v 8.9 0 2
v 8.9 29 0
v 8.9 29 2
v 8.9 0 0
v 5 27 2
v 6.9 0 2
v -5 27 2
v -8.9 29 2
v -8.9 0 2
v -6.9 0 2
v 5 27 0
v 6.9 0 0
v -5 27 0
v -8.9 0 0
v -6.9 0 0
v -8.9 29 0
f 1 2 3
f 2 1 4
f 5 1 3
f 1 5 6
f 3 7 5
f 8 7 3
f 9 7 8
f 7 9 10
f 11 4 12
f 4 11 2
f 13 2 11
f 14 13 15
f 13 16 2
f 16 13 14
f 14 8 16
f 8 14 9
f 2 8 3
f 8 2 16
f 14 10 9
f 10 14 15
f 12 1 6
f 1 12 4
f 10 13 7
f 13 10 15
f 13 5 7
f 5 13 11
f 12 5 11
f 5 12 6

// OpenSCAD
height=27;
top=13.8 / 2;
bottom=10 / 2;
width=2;

margin = 2;
cube_width = top + margin;

difference() {

translate([-cube_width, 0, 0]) {
cube([cube_width*2, height + margin, width]);
}
    

linear_extrude(height=width) {
polygon(points=[
  [-top, 0],
  [top, 0],
  [bottom, height],
  [-bottom, height]
]);
}



}
